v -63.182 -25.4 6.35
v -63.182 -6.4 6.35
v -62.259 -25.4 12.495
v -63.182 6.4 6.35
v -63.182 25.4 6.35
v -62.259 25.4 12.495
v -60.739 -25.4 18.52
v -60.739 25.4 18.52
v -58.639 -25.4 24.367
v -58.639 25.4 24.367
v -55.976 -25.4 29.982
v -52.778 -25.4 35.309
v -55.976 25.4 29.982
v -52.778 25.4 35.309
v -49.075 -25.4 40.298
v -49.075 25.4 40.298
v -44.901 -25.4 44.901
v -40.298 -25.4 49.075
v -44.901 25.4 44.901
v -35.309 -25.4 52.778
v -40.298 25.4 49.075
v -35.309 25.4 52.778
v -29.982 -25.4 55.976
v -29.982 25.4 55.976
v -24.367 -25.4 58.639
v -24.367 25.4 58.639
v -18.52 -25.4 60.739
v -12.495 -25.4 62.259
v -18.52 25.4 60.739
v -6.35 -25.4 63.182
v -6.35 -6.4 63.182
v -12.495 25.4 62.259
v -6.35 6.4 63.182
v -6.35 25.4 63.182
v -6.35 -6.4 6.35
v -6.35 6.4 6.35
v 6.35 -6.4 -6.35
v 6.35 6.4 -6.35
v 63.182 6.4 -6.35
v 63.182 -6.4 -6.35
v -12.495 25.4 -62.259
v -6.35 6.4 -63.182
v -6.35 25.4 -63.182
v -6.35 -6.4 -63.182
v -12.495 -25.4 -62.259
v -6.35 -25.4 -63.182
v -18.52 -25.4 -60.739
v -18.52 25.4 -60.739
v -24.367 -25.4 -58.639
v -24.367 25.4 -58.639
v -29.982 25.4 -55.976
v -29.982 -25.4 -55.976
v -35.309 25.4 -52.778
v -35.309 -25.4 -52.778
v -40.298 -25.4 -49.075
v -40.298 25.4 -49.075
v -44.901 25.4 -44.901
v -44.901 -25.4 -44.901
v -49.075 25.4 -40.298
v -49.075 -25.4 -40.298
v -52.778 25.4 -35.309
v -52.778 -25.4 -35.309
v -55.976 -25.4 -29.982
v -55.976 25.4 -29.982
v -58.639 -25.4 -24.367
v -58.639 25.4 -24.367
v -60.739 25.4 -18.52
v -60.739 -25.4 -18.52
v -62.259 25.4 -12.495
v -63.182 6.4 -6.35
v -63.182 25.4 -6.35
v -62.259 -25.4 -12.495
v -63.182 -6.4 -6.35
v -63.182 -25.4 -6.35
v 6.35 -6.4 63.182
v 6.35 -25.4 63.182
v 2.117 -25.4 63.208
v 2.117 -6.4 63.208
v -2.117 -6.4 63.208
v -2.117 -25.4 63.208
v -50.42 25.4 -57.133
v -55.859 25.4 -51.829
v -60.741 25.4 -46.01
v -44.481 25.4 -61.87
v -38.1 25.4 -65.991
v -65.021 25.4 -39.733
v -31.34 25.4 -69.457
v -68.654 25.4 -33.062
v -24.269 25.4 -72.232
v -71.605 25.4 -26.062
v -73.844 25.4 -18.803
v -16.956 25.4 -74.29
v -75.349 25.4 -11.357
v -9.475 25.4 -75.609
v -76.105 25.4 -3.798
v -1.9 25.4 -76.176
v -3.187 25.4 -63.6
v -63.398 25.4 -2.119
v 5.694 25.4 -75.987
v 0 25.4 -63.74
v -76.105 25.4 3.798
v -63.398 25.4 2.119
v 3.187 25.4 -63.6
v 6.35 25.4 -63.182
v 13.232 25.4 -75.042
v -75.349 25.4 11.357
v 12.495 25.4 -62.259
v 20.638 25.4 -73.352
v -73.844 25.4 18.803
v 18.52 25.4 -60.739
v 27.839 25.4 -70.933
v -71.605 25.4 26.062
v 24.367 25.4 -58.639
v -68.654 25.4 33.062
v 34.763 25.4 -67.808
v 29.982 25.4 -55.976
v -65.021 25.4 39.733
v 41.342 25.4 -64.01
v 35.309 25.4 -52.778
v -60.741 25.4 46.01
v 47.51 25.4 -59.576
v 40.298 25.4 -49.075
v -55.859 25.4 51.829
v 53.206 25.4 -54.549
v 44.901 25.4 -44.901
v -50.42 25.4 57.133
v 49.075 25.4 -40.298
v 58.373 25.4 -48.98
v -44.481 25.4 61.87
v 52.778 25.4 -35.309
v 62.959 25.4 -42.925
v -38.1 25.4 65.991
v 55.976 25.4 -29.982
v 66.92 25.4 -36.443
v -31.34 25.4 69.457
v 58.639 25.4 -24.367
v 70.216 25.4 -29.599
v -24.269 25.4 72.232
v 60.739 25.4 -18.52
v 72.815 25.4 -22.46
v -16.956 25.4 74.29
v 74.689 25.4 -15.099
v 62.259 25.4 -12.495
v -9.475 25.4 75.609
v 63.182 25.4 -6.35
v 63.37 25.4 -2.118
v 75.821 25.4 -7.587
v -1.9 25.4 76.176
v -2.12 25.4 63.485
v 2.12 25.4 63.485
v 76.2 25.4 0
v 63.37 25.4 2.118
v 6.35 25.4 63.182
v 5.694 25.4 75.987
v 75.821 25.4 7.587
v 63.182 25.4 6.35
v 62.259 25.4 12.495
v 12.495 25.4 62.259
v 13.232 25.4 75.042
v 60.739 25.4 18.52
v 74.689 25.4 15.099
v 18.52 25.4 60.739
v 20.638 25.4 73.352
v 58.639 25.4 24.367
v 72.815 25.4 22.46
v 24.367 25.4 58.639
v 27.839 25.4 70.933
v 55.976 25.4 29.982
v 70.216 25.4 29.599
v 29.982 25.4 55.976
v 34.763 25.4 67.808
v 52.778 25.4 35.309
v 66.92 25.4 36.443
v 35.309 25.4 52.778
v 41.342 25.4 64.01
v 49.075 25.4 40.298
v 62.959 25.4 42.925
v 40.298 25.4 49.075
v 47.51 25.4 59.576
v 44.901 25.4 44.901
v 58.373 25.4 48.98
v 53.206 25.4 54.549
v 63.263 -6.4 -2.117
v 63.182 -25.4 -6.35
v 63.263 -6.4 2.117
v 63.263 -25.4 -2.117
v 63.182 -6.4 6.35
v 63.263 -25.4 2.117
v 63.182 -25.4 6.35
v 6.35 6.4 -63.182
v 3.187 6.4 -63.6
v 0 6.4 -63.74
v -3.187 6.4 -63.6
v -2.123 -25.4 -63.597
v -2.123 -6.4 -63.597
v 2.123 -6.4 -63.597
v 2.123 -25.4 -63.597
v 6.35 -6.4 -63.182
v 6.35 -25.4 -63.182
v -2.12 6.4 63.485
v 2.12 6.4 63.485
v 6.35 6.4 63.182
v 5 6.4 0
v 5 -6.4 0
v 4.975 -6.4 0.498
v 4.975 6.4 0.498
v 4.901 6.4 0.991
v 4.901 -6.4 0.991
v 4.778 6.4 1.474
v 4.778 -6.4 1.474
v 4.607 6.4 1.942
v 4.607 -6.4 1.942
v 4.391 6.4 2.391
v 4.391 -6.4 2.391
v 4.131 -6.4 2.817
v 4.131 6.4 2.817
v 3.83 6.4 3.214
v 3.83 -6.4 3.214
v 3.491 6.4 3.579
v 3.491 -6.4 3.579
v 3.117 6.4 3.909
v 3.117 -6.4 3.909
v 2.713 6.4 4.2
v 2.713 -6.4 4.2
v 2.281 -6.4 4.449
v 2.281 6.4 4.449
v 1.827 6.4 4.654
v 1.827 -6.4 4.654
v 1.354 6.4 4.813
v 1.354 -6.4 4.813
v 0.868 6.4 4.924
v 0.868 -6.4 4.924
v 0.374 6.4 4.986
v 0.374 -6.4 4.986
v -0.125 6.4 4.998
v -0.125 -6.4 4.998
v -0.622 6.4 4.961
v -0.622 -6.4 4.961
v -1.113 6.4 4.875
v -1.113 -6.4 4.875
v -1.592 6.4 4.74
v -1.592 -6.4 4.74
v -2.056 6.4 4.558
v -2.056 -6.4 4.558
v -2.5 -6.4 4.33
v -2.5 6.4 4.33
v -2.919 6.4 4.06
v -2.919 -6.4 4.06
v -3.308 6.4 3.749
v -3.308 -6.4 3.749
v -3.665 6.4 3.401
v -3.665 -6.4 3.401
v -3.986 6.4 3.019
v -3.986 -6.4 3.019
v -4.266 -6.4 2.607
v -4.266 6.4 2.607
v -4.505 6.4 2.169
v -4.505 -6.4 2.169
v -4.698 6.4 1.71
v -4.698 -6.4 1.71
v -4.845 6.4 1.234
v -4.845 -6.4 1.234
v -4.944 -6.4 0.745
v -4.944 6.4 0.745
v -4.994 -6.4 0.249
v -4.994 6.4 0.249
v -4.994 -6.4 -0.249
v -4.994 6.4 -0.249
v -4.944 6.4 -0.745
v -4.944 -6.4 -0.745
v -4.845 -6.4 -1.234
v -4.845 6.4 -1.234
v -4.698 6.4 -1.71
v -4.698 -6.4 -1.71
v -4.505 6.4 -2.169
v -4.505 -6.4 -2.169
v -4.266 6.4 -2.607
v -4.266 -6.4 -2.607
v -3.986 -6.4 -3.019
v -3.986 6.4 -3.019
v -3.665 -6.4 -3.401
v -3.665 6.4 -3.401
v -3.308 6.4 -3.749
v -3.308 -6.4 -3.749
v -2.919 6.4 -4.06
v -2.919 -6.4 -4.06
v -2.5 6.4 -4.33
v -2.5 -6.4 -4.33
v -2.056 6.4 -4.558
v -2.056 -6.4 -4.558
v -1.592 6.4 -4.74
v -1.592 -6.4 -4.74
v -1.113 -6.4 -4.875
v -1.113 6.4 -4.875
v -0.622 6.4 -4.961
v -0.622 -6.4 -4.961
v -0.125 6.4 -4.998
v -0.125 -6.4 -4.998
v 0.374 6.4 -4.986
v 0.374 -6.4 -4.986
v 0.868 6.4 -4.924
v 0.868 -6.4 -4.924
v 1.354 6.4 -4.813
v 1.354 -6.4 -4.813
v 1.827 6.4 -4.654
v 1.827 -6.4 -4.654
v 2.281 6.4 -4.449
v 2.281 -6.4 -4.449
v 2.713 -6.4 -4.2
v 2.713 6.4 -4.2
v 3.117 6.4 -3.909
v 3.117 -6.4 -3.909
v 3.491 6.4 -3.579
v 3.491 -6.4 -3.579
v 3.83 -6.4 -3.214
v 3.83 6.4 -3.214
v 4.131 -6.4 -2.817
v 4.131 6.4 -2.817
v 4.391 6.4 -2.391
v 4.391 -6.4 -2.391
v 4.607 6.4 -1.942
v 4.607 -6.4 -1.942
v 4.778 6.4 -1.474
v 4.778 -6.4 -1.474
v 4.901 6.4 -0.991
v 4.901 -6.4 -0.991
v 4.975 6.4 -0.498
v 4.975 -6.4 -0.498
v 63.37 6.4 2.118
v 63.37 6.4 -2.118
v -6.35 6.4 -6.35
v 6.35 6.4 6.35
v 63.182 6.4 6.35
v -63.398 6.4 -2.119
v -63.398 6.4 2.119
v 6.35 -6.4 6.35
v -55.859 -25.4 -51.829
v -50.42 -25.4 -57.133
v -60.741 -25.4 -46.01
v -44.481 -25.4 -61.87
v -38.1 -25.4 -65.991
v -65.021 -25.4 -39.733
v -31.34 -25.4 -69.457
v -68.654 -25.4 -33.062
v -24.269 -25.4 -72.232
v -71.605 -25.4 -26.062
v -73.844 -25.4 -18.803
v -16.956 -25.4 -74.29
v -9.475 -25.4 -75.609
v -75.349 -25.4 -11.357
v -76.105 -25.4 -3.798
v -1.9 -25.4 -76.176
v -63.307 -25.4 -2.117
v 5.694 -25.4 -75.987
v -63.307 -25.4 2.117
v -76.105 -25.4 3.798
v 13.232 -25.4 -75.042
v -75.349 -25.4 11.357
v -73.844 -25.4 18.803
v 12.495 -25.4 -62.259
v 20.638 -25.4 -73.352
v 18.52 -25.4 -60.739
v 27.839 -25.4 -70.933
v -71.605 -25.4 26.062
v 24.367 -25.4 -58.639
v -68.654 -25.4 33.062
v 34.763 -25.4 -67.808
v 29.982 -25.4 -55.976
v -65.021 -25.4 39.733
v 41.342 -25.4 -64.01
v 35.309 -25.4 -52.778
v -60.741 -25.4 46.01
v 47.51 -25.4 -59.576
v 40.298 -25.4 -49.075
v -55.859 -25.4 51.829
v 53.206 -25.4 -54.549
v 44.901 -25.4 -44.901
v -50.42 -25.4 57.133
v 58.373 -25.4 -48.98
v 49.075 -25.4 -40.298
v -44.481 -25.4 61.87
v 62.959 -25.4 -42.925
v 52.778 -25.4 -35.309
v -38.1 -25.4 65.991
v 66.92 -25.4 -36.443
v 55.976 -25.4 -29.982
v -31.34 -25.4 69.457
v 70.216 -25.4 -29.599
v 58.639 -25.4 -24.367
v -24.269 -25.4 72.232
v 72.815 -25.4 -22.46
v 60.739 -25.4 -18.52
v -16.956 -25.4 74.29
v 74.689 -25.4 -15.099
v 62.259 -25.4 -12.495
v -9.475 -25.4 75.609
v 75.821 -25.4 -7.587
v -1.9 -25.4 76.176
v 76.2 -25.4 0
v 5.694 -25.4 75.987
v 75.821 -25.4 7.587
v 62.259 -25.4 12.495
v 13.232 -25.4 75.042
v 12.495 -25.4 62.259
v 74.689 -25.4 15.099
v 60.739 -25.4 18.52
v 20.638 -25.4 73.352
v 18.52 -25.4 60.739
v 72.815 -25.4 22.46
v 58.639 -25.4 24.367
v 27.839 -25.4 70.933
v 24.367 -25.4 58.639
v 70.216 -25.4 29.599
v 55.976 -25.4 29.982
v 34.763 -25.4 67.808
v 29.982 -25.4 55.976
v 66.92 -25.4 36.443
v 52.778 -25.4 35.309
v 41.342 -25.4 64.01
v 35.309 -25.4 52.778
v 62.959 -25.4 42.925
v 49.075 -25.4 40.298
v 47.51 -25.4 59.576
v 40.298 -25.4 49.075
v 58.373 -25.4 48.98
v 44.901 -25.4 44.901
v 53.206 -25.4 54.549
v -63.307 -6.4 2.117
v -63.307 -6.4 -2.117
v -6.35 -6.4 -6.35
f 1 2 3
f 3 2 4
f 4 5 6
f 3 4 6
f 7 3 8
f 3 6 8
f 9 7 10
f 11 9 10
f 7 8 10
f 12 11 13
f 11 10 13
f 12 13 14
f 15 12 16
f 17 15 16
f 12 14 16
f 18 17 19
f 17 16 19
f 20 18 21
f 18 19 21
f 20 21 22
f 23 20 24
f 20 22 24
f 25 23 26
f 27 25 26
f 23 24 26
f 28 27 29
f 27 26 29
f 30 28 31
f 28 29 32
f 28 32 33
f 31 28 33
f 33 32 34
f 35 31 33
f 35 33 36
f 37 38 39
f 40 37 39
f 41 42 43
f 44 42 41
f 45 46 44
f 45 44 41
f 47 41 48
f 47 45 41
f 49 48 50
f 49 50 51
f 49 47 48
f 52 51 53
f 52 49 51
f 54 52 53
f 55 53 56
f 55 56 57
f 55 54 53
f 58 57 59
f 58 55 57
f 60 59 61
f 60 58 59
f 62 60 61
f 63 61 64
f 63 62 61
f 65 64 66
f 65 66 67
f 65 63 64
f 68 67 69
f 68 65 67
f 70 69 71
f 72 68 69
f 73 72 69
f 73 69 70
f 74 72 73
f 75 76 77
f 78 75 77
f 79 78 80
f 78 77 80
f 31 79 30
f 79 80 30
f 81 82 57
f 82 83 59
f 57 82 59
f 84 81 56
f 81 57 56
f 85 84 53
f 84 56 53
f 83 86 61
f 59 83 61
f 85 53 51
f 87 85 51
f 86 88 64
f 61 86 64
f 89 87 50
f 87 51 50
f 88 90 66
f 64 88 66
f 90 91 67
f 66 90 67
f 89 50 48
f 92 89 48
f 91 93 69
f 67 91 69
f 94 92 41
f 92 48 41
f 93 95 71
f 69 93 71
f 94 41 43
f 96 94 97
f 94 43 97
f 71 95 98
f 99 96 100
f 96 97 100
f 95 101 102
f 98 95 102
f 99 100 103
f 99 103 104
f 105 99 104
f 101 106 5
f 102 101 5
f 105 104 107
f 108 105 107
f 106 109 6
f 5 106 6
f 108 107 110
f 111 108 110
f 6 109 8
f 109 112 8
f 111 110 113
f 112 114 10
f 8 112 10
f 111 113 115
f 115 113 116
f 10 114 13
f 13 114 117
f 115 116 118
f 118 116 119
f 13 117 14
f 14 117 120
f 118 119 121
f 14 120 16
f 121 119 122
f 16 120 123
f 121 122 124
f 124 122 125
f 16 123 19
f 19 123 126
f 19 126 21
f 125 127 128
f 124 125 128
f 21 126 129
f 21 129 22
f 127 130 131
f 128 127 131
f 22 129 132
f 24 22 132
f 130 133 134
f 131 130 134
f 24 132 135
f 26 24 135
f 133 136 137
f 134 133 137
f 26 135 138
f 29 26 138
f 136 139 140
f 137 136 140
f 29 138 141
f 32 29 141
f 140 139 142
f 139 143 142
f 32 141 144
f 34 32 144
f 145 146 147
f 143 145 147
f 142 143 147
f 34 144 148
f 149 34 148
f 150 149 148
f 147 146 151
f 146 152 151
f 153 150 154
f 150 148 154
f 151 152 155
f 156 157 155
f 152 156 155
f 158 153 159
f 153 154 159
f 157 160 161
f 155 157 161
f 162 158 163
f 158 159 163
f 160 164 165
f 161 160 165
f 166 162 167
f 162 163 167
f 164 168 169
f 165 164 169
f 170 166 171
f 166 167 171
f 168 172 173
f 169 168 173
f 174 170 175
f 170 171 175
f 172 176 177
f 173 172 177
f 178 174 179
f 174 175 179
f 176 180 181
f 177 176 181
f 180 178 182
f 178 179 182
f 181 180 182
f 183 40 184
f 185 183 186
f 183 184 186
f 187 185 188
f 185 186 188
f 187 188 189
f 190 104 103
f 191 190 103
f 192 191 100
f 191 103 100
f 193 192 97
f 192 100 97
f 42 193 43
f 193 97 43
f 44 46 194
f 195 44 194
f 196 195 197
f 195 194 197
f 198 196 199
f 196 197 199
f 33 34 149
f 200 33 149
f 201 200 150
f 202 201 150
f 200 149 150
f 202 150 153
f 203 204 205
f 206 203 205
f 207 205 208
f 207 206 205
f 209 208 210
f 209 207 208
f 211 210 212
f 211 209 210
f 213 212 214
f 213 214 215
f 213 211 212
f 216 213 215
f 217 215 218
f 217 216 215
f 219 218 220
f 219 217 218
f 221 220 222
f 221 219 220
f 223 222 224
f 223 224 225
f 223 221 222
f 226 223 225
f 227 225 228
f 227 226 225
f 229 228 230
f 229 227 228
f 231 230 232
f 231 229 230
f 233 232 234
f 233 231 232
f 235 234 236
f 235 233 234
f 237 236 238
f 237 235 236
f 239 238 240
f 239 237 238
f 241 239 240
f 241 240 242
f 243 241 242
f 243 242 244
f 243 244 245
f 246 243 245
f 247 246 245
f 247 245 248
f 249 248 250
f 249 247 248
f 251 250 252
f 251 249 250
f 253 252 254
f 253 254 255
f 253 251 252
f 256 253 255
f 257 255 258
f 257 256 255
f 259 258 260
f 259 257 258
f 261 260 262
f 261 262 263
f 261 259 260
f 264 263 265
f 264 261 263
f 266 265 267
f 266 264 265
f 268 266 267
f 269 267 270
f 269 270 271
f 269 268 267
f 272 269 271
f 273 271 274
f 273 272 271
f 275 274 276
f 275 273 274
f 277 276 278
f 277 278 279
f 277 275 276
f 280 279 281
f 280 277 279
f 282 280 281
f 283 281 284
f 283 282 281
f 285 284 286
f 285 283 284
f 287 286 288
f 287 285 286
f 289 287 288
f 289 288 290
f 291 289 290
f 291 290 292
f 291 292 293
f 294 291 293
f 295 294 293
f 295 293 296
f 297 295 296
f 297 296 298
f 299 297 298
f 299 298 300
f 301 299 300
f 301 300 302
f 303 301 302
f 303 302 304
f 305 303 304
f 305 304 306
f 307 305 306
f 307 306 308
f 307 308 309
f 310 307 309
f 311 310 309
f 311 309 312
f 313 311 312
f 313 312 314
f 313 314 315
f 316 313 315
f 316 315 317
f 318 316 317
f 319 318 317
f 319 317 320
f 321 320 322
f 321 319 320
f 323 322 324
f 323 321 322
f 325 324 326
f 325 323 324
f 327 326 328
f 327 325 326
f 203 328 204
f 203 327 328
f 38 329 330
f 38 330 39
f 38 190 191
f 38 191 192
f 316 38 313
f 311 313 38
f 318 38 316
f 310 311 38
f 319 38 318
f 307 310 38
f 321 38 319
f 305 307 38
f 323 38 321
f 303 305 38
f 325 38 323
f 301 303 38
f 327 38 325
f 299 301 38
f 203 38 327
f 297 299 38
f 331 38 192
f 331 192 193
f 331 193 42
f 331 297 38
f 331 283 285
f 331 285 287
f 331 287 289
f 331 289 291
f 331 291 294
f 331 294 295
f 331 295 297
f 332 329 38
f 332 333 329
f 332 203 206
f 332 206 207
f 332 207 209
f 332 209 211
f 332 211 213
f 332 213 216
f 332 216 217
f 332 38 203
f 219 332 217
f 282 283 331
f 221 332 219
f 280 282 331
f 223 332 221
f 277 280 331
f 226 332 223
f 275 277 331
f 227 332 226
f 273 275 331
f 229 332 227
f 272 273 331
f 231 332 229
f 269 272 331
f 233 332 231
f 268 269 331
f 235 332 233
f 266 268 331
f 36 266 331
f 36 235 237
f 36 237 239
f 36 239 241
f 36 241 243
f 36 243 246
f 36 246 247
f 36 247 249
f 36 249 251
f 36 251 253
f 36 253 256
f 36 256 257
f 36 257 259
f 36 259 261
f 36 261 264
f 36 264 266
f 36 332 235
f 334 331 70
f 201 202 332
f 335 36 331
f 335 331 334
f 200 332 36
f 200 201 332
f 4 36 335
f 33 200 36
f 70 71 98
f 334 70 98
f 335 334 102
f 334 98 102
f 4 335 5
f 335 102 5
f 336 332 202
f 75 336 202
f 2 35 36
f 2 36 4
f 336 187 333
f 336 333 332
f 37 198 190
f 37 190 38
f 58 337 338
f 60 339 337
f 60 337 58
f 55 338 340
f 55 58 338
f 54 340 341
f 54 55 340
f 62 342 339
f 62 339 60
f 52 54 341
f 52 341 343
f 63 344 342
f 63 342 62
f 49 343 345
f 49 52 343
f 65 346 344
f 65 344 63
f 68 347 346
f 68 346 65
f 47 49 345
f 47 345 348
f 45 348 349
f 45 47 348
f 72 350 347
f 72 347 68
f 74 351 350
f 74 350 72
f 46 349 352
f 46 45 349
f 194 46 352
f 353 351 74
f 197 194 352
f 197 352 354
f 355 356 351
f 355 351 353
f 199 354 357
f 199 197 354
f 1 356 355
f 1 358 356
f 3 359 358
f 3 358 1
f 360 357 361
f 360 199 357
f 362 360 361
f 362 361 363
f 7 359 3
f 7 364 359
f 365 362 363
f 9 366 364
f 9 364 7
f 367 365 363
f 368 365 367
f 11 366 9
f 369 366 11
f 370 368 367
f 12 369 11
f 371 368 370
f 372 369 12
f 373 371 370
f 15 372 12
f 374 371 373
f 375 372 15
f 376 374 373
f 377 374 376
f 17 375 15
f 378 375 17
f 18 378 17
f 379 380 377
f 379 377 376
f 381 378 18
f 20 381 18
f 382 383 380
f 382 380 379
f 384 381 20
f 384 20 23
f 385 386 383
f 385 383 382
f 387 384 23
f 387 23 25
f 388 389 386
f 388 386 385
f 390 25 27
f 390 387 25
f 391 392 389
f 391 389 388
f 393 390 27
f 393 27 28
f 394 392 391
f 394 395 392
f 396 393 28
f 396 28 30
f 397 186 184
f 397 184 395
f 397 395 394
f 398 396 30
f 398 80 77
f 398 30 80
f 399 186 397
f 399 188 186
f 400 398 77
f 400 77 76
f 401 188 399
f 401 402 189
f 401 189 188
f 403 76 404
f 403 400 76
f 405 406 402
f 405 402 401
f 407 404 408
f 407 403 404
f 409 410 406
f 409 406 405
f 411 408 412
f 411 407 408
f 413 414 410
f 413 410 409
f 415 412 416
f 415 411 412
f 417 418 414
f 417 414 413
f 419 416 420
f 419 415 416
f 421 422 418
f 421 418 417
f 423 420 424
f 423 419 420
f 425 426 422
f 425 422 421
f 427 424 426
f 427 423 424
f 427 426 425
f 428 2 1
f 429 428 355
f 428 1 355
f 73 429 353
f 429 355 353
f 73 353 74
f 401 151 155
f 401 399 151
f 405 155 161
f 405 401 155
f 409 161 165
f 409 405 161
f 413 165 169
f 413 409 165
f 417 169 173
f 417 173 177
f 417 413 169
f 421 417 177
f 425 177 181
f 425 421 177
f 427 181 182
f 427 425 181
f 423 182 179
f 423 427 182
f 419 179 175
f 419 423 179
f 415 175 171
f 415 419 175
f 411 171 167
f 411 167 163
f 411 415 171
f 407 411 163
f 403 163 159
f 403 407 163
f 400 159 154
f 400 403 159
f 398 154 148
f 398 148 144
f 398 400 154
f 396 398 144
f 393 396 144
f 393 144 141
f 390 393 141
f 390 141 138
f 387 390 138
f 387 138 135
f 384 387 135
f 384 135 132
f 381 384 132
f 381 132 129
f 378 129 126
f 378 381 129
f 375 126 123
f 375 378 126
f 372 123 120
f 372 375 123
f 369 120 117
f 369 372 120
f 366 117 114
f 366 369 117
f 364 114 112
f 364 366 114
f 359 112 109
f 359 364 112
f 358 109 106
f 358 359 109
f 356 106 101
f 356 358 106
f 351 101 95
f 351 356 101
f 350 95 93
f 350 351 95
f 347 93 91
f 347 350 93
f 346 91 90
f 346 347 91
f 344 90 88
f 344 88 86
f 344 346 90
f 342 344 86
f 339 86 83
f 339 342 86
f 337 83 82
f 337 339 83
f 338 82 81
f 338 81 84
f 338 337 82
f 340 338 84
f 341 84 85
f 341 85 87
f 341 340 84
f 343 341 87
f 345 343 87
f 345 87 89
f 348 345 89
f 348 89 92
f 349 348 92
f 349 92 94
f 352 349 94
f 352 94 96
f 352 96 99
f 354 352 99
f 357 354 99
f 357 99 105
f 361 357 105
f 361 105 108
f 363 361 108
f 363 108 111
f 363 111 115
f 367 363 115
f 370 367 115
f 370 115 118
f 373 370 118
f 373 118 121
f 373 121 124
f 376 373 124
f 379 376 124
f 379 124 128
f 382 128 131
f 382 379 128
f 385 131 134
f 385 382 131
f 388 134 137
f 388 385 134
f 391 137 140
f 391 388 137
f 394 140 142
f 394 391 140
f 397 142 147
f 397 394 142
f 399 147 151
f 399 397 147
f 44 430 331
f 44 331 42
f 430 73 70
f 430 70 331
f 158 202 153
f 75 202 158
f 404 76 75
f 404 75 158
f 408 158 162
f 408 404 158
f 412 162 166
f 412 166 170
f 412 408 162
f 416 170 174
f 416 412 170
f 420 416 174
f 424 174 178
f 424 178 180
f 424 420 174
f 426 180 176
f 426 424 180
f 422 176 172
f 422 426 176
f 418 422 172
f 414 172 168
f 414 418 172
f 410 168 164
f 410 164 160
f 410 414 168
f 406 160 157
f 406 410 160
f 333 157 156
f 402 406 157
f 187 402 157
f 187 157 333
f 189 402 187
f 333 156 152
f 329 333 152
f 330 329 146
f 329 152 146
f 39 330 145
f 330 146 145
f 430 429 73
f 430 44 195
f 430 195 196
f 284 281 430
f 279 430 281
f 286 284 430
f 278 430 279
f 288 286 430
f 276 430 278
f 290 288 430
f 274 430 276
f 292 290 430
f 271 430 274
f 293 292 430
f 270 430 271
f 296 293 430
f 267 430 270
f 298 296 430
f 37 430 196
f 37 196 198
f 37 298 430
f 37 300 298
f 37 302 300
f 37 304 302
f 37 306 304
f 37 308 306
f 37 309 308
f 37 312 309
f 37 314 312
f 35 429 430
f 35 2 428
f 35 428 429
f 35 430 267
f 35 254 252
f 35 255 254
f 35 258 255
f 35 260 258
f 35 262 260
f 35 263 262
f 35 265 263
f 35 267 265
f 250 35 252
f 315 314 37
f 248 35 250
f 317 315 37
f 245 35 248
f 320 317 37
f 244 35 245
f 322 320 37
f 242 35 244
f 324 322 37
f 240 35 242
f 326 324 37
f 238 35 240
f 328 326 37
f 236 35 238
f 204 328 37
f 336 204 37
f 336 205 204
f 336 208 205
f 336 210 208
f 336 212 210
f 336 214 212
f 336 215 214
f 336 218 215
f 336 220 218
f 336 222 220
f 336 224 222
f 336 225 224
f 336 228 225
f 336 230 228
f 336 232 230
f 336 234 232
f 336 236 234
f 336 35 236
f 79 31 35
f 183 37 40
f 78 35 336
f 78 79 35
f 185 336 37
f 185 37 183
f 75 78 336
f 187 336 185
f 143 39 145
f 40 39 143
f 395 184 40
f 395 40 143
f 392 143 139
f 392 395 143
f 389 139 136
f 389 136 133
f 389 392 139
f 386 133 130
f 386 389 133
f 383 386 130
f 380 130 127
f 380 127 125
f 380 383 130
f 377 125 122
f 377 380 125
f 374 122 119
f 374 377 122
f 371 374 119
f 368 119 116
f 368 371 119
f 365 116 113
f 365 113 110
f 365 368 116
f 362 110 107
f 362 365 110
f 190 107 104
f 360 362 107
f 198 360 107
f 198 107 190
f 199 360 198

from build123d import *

# Parameters (mm, degrees)
F0_R     = 76.2
F0_R_2   = 5
F1_DEPTH = 25.4
F2_R     = 5
F3_DEPTH = 19
F4_R     = 5
F5_DEPTH = 19


with BuildPart() as f1:
    # F0 (on Front) → F1 (new body, symmetric)
    with BuildSketch(Plane.XZ):
        Circle(F0_R)
        with BuildLine():
            ThreePointArc((-6.35, -63.181702), (-44.901281, -44.901281), (-63.181702, -6.35))
            Line((-63.181702, -6.35), (-6.35, -6.35))
            Line((-6.35, -6.35), (-6.35, -63.181702))
        make_face(mode=Mode.SUBTRACT)
        with BuildLine():
            Line((6.35, -6.35), (63.181702, -6.35))
            ThreePointArc((63.181702, -6.35), (44.901281, -44.901281), (6.35, -63.181702))
            Line((6.35, -63.181702), (6.35, -6.35))
        make_face(mode=Mode.SUBTRACT)
        with BuildLine():
            ThreePointArc((-63.181702, 6.35), (-44.901281, 44.901281), (-6.35, 63.181702))
            Line((-6.35, 63.181702), (-6.35, 6.35))
            Line((-6.35, 6.35), (-63.181702, 6.35))
        make_face(mode=Mode.SUBTRACT)
        Circle(F0_R_2, mode=Mode.SUBTRACT)
        with BuildLine():
            Line((6.35, 6.35), (6.35, 63.181702))
            ThreePointArc((6.35, 63.181702), (44.901281, 44.901281), (63.181702, 6.35))
            Line((63.181702, 6.35), (6.35, 6.35))
        make_face(mode=Mode.SUBTRACT)
    extrude(amount=F1_DEPTH, both=True)

    # F2 (on face) → F3 (cut)
    with BuildSketch(Plane.XZ.offset(25.4)):
        with BuildLine():
            Line((-6.35, 6.35), (-63.181702, 6.35))
            ThreePointArc((-63.181702, 6.35), (-63.322942, 0), (-63.181702, -6.35))
            Line((-63.181702, -6.35), (-6.35, -6.35))
            Line((-6.35, -6.35), (-6.35, -63.181702))
            ThreePointArc((-6.35, -63.181702), (0, -63.649263), (6.35, -63.181702))
            Line((6.35, -63.181702), (6.35, -6.35))
            Line((6.35, -6.35), (63.181702, -6.35))
            ThreePointArc((63.181702, -6.35), (63.272965, 0), (63.181702, 6.35))
            Line((63.181702, 6.35), (6.35, 6.35))
            Line((6.35, 6.35), (6.35, 63.181702))
            ThreePointArc((6.35, 63.181702), (0, 63.211711), (-6.35, 63.181702))
            Line((-6.35, 63.181702), (-6.35, 6.35))
        make_face()
        Circle(F2_R, mode=Mode.SUBTRACT)
    extrude(amount=-F3_DEPTH, mode=Mode.SUBTRACT)

    # F4 (on face) → F5 (cut)
    with BuildSketch(Plane(origin=(0, 25.4, 0), x_dir=(-1, 0, 0), z_dir=(0, 1, 0))):
        with BuildLine():
            Line((6.35, 6.35), (6.35, 63.181702))
            ThreePointArc((6.35, 63.181702), (0, 63.522837), (-6.35, 63.181702))
            Line((-6.35, 63.181702), (-6.35, 6.35))
            Line((-6.35, 6.35), (-63.181702, 6.35))
            ThreePointArc((-63.181702, 6.35), (-63.393876, 0), (-63.181702, -6.35))
            Line((-63.181702, -6.35), (-6.35, -6.35))
            Line((-6.35, -6.35), (-6.35, -63.181702))
            ThreePointArc((-6.35, -63.181702), (0, -63.739805), (6.35, -63.181702))
            Line((6.35, -63.181702), (6.35, -6.35))
            Line((6.35, -6.35), (63.181702, -6.35))
            ThreePointArc((63.181702, -6.35), (63.425239, 0), (63.181702, 6.35))
            Line((63.181702, 6.35), (6.35, 6.35))
        make_face()
        Circle(F4_R, mode=Mode.SUBTRACT)
    extrude(amount=-F5_DEPTH, mode=Mode.SUBTRACT)


solid = f1.part
